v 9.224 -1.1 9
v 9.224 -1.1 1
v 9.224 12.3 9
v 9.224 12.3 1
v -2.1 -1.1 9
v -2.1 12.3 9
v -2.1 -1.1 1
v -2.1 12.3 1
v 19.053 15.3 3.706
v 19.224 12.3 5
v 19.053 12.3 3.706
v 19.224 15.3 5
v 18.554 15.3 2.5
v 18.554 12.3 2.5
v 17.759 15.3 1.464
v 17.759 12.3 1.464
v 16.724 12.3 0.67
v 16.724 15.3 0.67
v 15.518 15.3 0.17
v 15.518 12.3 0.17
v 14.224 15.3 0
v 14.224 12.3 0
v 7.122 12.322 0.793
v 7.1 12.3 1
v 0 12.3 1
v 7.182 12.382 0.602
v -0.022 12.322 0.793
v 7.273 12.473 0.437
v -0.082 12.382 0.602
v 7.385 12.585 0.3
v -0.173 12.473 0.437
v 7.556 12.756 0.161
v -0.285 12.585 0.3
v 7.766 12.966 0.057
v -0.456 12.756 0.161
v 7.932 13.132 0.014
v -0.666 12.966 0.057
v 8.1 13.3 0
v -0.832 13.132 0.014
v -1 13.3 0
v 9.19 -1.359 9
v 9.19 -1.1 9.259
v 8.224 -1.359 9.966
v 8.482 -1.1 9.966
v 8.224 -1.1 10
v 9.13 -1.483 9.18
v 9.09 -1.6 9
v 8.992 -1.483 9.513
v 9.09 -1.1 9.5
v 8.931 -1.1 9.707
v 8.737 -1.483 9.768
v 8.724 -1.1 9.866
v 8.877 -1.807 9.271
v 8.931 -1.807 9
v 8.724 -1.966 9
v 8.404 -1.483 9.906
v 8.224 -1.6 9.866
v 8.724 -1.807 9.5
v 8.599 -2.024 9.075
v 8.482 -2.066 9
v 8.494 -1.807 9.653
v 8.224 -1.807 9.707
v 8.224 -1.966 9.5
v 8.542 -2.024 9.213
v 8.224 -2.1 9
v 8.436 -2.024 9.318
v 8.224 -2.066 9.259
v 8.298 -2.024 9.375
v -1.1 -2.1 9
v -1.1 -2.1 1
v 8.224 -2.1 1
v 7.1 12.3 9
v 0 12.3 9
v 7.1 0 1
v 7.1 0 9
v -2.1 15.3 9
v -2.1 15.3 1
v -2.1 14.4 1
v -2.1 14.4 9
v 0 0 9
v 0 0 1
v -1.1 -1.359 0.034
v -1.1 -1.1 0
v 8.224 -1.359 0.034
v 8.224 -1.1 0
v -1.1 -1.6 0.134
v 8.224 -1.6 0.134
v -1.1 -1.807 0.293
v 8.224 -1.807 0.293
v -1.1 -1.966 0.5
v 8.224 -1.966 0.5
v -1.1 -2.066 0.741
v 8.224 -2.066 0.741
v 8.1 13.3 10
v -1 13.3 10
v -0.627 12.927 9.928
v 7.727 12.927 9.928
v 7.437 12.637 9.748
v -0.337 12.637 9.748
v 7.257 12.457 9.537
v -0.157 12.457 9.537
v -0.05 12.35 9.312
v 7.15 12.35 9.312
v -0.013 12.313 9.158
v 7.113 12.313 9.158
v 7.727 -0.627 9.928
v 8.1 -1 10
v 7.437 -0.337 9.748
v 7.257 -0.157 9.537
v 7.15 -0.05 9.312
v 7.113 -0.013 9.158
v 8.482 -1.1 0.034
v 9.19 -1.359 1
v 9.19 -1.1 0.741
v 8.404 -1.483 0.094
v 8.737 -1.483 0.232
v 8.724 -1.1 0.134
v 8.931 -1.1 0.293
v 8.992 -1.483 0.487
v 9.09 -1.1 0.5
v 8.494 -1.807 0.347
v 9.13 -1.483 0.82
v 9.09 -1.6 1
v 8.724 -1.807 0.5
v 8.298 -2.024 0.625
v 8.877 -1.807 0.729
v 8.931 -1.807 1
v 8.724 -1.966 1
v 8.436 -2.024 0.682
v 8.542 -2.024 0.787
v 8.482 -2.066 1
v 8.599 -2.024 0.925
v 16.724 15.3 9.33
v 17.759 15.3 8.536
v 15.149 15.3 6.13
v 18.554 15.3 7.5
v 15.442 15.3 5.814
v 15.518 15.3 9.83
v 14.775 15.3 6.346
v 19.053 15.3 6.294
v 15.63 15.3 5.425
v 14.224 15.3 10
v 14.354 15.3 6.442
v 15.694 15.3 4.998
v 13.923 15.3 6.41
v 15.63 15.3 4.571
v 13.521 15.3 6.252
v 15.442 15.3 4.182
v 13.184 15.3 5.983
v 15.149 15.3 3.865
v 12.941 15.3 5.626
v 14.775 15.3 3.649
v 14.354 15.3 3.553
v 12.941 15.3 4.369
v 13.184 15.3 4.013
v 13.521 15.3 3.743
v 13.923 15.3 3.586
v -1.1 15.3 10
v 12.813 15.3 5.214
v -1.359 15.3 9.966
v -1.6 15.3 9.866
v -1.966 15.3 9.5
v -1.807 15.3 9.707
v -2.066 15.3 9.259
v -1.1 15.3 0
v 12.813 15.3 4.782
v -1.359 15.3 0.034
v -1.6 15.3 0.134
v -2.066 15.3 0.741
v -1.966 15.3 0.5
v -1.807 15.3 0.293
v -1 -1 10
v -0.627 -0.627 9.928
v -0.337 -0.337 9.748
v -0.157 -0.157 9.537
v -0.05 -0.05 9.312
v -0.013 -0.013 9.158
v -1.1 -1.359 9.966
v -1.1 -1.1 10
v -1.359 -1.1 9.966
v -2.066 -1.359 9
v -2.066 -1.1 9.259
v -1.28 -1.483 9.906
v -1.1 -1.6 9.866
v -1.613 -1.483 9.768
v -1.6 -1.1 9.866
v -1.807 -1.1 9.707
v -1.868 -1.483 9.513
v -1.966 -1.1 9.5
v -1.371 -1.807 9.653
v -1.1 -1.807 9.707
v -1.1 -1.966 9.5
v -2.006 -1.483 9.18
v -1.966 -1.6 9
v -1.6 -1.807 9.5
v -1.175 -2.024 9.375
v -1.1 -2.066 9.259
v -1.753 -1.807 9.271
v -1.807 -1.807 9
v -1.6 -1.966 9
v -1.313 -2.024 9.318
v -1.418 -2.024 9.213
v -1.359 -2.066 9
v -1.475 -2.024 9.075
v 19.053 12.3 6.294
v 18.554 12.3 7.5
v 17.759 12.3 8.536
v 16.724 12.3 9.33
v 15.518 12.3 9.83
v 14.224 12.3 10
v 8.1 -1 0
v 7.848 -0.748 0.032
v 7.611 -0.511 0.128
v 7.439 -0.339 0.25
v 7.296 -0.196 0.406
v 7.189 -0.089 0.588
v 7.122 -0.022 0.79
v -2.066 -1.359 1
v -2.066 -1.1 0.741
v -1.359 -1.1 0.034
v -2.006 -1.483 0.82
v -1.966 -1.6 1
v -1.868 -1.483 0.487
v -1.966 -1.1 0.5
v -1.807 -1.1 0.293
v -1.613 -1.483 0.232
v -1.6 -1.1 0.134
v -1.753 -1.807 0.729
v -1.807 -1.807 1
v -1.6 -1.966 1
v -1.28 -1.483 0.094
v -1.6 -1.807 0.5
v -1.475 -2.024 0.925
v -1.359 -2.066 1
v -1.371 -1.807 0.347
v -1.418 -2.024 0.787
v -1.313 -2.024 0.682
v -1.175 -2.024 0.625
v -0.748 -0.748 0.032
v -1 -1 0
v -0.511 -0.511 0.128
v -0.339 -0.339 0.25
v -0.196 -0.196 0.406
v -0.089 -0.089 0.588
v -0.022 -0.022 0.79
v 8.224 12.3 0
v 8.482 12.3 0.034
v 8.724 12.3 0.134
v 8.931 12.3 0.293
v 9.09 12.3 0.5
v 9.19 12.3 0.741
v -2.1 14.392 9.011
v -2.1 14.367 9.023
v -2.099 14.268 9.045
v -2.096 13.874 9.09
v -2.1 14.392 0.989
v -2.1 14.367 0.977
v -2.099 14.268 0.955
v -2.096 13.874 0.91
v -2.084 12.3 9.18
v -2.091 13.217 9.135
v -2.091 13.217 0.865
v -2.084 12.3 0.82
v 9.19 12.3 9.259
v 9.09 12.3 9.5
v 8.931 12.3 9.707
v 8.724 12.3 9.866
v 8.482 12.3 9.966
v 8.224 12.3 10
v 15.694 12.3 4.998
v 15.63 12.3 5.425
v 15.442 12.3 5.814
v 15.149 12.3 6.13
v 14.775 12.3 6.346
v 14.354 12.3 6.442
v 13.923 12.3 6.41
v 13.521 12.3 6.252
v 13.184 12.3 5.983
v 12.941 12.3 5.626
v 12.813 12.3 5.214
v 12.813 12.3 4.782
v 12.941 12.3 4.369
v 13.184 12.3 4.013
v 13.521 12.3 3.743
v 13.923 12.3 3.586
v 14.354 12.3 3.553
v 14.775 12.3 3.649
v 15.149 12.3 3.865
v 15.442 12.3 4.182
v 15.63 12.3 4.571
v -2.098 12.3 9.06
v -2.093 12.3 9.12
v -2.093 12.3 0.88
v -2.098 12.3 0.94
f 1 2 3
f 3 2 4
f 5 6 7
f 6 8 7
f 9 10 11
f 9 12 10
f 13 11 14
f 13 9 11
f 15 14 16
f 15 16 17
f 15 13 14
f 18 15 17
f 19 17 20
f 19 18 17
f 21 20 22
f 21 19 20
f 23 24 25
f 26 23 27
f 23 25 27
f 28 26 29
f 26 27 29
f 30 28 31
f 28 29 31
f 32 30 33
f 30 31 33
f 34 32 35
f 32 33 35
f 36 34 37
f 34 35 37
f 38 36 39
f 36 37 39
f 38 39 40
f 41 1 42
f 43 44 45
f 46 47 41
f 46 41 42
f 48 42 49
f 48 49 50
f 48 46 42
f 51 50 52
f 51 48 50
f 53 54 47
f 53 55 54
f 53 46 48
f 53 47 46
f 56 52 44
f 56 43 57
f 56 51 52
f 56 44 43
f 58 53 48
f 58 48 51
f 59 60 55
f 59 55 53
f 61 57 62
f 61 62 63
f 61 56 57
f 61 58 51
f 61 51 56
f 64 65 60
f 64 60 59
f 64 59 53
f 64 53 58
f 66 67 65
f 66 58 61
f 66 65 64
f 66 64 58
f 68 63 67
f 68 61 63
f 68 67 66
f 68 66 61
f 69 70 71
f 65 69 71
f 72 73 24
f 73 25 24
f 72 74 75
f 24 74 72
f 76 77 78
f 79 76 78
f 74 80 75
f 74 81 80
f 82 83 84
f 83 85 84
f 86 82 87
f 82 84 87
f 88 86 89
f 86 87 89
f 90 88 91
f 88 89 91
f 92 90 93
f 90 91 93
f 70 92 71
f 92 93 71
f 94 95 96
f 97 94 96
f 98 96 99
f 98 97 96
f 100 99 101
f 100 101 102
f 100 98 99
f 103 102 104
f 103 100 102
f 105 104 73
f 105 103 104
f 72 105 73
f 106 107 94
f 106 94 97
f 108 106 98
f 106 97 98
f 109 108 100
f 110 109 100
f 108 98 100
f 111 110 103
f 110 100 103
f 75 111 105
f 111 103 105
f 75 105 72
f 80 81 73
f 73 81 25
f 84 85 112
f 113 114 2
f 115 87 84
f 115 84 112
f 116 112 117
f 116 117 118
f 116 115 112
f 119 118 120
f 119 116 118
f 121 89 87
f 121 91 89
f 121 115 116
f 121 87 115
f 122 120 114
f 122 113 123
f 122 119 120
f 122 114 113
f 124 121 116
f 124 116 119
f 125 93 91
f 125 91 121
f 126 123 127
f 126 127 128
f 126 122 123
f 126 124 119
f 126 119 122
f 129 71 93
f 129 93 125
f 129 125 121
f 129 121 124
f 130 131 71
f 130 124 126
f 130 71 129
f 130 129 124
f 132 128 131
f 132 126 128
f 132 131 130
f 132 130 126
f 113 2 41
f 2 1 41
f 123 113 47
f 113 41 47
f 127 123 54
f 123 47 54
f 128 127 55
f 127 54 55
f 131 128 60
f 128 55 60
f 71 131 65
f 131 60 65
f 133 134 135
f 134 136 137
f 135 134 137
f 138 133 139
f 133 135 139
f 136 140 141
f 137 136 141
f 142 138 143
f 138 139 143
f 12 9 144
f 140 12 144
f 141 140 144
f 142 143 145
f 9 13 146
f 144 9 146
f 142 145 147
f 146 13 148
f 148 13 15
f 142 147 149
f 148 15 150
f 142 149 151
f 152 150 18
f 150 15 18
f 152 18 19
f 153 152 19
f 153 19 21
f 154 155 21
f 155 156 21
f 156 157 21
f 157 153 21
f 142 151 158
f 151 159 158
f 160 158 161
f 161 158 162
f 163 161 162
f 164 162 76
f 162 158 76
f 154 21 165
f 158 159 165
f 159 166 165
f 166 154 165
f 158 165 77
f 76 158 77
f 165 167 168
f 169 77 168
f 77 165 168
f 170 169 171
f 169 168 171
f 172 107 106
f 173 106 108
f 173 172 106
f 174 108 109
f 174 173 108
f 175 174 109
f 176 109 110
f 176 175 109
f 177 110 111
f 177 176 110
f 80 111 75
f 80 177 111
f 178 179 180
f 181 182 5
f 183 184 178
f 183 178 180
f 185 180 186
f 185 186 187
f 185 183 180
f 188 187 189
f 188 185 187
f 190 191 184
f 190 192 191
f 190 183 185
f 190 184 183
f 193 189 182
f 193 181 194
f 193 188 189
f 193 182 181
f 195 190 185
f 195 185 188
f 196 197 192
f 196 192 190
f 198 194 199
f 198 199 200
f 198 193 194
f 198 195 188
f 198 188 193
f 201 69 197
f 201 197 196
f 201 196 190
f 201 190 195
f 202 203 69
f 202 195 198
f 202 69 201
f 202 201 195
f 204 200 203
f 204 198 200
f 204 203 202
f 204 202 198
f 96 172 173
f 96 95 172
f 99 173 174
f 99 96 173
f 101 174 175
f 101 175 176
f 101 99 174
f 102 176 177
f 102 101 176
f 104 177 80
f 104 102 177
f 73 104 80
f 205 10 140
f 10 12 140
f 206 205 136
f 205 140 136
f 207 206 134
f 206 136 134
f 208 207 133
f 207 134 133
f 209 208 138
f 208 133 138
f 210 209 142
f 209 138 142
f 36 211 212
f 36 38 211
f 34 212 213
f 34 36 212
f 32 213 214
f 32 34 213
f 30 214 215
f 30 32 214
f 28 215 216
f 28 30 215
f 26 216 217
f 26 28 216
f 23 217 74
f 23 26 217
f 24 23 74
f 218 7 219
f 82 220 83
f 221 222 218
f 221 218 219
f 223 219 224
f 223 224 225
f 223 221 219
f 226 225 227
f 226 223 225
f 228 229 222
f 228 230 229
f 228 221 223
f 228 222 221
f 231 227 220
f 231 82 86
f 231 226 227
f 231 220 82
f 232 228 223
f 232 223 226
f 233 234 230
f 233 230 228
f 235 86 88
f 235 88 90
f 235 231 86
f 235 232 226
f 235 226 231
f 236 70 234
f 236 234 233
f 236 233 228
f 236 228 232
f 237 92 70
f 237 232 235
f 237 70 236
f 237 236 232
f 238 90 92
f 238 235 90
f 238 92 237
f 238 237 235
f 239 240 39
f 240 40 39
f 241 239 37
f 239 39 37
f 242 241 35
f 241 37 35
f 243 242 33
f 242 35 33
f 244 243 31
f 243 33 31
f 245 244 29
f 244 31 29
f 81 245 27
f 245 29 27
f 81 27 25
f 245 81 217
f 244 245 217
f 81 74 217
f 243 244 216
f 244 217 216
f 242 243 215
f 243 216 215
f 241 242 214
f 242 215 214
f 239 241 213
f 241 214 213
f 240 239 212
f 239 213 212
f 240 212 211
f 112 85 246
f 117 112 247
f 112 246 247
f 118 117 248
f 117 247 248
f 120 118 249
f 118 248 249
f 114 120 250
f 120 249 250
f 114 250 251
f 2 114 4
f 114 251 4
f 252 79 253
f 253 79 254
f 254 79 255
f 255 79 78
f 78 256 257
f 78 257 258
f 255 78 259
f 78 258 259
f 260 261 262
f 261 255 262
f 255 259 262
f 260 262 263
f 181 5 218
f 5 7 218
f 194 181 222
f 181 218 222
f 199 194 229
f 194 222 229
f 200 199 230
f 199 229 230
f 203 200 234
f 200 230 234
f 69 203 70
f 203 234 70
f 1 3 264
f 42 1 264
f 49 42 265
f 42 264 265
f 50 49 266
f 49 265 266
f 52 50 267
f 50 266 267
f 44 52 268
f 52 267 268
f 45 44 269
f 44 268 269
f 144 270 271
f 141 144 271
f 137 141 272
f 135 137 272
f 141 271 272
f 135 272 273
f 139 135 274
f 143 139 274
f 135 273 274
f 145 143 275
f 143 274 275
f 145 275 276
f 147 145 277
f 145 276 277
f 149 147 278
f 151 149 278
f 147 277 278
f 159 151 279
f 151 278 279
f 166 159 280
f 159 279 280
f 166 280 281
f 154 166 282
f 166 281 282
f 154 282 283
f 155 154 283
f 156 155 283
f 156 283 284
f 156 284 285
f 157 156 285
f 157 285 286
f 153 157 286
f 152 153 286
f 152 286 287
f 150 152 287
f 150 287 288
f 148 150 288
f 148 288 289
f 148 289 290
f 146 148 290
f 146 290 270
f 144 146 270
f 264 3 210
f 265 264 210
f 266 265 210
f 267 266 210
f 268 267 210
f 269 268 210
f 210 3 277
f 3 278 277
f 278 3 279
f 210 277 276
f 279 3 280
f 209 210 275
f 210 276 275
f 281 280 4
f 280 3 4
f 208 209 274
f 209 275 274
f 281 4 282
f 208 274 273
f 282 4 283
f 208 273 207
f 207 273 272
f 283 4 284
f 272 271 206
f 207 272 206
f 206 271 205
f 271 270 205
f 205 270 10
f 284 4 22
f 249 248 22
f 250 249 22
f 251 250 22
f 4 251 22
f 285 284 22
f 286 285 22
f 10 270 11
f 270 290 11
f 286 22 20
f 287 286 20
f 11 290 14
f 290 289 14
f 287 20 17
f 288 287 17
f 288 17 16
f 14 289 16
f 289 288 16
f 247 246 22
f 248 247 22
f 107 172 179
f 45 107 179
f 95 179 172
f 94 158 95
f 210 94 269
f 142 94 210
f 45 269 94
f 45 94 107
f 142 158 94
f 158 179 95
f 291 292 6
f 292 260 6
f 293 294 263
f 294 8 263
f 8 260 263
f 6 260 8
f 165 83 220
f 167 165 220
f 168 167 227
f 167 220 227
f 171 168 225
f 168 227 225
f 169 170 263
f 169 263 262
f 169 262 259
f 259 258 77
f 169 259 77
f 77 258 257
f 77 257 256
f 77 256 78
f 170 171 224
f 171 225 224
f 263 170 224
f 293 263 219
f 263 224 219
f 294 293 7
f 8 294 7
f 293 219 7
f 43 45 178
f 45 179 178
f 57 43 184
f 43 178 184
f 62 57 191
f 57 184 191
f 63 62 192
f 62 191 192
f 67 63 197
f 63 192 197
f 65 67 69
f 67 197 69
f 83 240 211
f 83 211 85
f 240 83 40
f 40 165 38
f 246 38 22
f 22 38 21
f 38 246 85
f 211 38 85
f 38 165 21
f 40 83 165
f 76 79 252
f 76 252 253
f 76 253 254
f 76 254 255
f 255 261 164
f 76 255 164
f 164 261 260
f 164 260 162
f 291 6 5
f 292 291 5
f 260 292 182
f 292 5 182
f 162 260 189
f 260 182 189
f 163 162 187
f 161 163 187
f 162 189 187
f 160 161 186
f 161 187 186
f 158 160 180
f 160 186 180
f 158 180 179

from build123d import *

# Parameters (mm, degrees)
F0_W      = 10
F0_H      = 3
F0_W_2    = 7.1
F0_H_2    = 12.3
F1_DEPTH  = 10
F2_R      = 1.4483503842
F1_FACE_W = 21.323674424
F1_FACE_H = 10
F3_DEPTH  = 15.301
F4_R      = 4.99999
F5_F1_R   = 1
F5_F2_R   = 1
F5_F3_R   = 1
F5_F4_R   = 1
F5_F5_R   = 1
F5_F6_R   = 1
F5_F7_R   = 1
F5_F8_R   = 1
F5_F9_R   = 1
F5_F10_R  = 0.9999
F5_F11_R  = 1
F5_F12_R  = 1
F5_F13_R  = 1


# Not quite as in the source:
# - a fillet or chamfer is up to 0.001 mm smaller than in the source, because OpenCascade refuses the exact size


with BuildPart() as f1:
    # F0 (on Top) → F1 (new body)
    with BuildSketch(Plane.XY):
        with Locations((14.223674424, 13.8)):
            Rectangle(F0_W, F0_H)
        Polygon((-2.1, 12.3), (-2.1, 0), (-2.1, -2.1), (7.1, -2.1), (9.223674424, -2.1), (9.223674424, 12.3), (9.223674424, 15.3), (-2.1, 15.3), (-2.1, 14.4), (-2.0836676853, 12.3), align=None)
        with Locations((3.55, 6.15)):
            Rectangle(F0_W_2, F0_H_2, mode=Mode.SUBTRACT)
    extrude(amount=F1_DEPTH)

    # F2 (on Front) + F1_face (on face) → F3 (cut, through all)
    with BuildSketch(Plane.XZ):
        with Locations((14.2455906607, 4.9976706505)):
            Circle(F2_R)
    with BuildSketch(Plane(origin=(8.561837212, 15.3, 5), x_dir=(-1, 0, 0), z_dir=(0, 1, 0))):
        Rectangle(F1_FACE_W, F1_FACE_H)
    extrude(amount=-F3_DEPTH, dir=(0, -1, 0), mode=Mode.SUBTRACT)

    # F4 (radius 5 in the source; OpenCascade refuses exactly that, so slightly less here)
    f4_edges = [f1.edges().sort_by_distance(p)[0] for p in [
        (19.223674, 13.8, 10),
        (19.223674, 13.8, 0),
    ]]
    fillet(f4_edges, radius=F4_R)

    # F5: fillet of radius 1 on 18 edges, made by hand

    # F5_f1
    f5_f1_edges = [f1.edges().sort_by_distance(p)[0] for p in [
        (9.223674424, 5.1, 0),
    ]]
    fillet(f5_f1_edges, radius=F5_F1_R)

    # F5_f2
    f5_f2_edges = [f1.edges().sort_by_distance(p)[0] for p in [
        (-2.1, 5.1, 0),
    ]]
    fillet(f5_f2_edges, radius=F5_F2_R)

    # F5_f3
    f5_f3_edges = [f1.edges().sort_by_distance(p)[0] for p in [
        (9.223674424, 5.1, 10),
    ]]
    fillet(f5_f3_edges, radius=F5_F3_R)

    # F5_f4
    f5_f4_edges = [f1.edges().sort_by_distance(p)[0] for p in [
        (-2.1, 5.1, 10),
    ]]
    fillet(f5_f4_edges, radius=F5_F4_R)

    # F5_f5
    f5_f5_edges = [f1.edges().sort_by_distance(p)[0] for p in [
        (0, 6.15, 0),
    ]]
    fillet(f5_f5_edges, radius=F5_F5_R)

    # F5_f6
    f5_f6_edges = [f1.edges().sort_by_distance(p)[0] for p in [
        (7.1, 6.15, 0),
    ]]
    fillet(f5_f6_edges, radius=F5_F6_R)

    # F5_f7
    f5_f7_edges = [f1.edges().sort_by_distance(p)[0] for p in [
        (0, 6.15, 10),
    ]]
    fillet(f5_f7_edges, radius=F5_F7_R)

    # F5_f8
    f5_f8_edges = [f1.edges().sort_by_distance(p)[0] for p in [
        (7.1, 6.15, 10),
    ]]
    fillet(f5_f8_edges, radius=F5_F8_R)

    # F5_f9
    f5_f9_edges = [f1.edges().sort_by_distance(p)[0] for p in [
        (3.561837212, -2.1, 0),
    ]]
    fillet(f5_f9_edges, radius=F5_F9_R)

    # F5_f10 (radius 1 in the source; OpenCascade refuses exactly that, so slightly less here)
    f5_f10_edges = [f1.edges().sort_by_distance(p)[0] for p in [
        (3.55, 12.3, 0),
    ]]
    fillet(f5_f10_edges, radius=F5_F10_R)

    # F5_f11
    f5_f11_edges = [f1.edges().sort_by_distance(p)[0] for p in [
        (3.55, 0, 0),
    ]]
    fillet(f5_f11_edges, radius=F5_F11_R)

    # F5_f12
    f5_f12_edges = [f1.edges().sort_by_distance(p)[0] for p in [
        (3.55, 12.3, 10),
    ]]
    fillet(f5_f12_edges, radius=F5_F12_R)

    # F5_f13
    f5_f13_edges = [f1.edges().sort_by_distance(p)[0] for p in [
        (3.55, 0, 10),
    ]]
    fillet(f5_f13_edges, radius=F5_F13_R)


solid = f1.part
